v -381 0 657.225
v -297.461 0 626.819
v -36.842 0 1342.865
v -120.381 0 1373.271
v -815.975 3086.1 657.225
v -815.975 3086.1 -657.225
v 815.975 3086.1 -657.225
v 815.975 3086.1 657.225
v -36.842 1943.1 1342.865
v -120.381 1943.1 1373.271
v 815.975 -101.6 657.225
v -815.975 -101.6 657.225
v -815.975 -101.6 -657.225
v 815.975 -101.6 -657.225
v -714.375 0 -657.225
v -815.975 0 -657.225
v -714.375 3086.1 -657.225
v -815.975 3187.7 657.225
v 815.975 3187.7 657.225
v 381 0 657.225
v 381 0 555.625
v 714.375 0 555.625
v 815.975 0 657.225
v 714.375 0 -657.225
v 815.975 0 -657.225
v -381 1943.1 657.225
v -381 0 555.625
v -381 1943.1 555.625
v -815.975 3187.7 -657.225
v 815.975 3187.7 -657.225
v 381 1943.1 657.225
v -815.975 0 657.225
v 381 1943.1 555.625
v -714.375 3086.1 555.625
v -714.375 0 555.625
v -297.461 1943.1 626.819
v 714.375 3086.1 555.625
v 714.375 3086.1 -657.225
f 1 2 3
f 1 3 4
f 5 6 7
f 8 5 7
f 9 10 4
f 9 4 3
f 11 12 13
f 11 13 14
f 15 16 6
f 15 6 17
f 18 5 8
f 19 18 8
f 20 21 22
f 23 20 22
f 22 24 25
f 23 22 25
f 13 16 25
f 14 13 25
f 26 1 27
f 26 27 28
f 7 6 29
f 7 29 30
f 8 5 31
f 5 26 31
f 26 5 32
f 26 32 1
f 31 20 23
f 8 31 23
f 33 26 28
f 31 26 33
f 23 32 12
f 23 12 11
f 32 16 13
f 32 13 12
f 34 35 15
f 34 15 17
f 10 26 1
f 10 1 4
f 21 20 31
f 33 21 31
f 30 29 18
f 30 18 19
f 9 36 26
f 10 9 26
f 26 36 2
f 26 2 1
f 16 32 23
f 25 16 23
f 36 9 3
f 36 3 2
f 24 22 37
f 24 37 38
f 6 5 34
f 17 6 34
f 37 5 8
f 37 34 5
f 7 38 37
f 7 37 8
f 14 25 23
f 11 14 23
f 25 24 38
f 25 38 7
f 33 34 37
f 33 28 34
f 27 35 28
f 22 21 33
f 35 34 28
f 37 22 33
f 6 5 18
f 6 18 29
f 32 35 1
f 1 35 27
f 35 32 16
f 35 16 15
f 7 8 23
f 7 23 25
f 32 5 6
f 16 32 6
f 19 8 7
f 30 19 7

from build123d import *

# Parameters (mm, degrees)
SKETCH1_W           = 1631.95
SKETCH1_H           = 1314.45
SKETCH1_W_2         = 1428.75
SKETCH1_H_2         = 1111.25
BOSS_EXTRUDE1_DEPTH = 3086.1
SKETCH2_W           = 1631.95
SKETCH2_H           = 1314.45
BOSS_EXTRUDE2_DEPTH = 101.6
SKETCH3_W           = 762
SKETCH3_H           = 1943.1
CUT_EXTRUDE1_DEPTH  = 101.6
SKETCH4_W           = 1631.95
SKETCH4_H           = 1314.45
BOSS_EXTRUDE3_DEPTH = 101.6
SKETCH5_W           = 1428.75
SKETCH5_H           = 3086.1
CUT_EXTRUDE2_DEPTH  = 3507.886313117
BOSS_EXTRUDE4_DEPTH = 1943.1


with BuildPart() as part:
    # Sketch1 → Boss-Extrude1 (new body)
    with BuildSketch(Plane(origin=(0, 0, 0), x_dir=(1, 0, 0), z_dir=(0, 1, 0))):
        Rectangle(SKETCH1_W, SKETCH1_H)
        Rectangle(SKETCH1_W_2, SKETCH1_H_2, mode=Mode.SUBTRACT)
    extrude(amount=BOSS_EXTRUDE1_DEPTH)

    # Sketch3 → Cut-Extrude1 (cut)
    with BuildSketch(Plane.XY.offset(657.225)):
        with Locations((0, 971.55)):
            Rectangle(SKETCH3_W, SKETCH3_H)
    extrude(amount=-CUT_EXTRUDE1_DEPTH, mode=Mode.SUBTRACT)

    # Sketch5 → Cut-Extrude2 (cut, through all)
    with BuildSketch(Plane.XY.offset(-555.625)):
        with Locations((0, 1543.05)):
            Rectangle(SKETCH5_W, SKETCH5_H)
    extrude(amount=-CUT_EXTRUDE2_DEPTH, mode=Mode.SUBTRACT)


with BuildPart() as body_2:
    # Sketch2 → Boss-Extrude2 (new body)
    with BuildSketch(Plane(origin=(0, 3086.1, 0), x_dir=(1, 0, 0), z_dir=(0, 1, 0))):
        Rectangle(SKETCH2_W, SKETCH2_H)
    extrude(amount=BOSS_EXTRUDE2_DEPTH)


with BuildPart() as body_3:
    # Sketch4 → Boss-Extrude3 (new body)
    with BuildSketch(Plane.XZ):
        Rectangle(SKETCH4_W, SKETCH4_H)
    extrude(amount=BOSS_EXTRUDE3_DEPTH)


with BuildPart() as body_4:
    # Sketch6 → Boss-Extrude4 (new body)
    with BuildSketch(Plane.XZ.offset(-1943.1)):
        Polygon((-381, 657.225), (-120.380650786, 1373.270777039), (-36.841976798, 1342.865186297), (-297.461326012, 626.819409258), align=None)
    extrude(amount=BOSS_EXTRUDE4_DEPTH)


solid = Compound([part.part, body_2.part, body_3.part, body_4.part])
